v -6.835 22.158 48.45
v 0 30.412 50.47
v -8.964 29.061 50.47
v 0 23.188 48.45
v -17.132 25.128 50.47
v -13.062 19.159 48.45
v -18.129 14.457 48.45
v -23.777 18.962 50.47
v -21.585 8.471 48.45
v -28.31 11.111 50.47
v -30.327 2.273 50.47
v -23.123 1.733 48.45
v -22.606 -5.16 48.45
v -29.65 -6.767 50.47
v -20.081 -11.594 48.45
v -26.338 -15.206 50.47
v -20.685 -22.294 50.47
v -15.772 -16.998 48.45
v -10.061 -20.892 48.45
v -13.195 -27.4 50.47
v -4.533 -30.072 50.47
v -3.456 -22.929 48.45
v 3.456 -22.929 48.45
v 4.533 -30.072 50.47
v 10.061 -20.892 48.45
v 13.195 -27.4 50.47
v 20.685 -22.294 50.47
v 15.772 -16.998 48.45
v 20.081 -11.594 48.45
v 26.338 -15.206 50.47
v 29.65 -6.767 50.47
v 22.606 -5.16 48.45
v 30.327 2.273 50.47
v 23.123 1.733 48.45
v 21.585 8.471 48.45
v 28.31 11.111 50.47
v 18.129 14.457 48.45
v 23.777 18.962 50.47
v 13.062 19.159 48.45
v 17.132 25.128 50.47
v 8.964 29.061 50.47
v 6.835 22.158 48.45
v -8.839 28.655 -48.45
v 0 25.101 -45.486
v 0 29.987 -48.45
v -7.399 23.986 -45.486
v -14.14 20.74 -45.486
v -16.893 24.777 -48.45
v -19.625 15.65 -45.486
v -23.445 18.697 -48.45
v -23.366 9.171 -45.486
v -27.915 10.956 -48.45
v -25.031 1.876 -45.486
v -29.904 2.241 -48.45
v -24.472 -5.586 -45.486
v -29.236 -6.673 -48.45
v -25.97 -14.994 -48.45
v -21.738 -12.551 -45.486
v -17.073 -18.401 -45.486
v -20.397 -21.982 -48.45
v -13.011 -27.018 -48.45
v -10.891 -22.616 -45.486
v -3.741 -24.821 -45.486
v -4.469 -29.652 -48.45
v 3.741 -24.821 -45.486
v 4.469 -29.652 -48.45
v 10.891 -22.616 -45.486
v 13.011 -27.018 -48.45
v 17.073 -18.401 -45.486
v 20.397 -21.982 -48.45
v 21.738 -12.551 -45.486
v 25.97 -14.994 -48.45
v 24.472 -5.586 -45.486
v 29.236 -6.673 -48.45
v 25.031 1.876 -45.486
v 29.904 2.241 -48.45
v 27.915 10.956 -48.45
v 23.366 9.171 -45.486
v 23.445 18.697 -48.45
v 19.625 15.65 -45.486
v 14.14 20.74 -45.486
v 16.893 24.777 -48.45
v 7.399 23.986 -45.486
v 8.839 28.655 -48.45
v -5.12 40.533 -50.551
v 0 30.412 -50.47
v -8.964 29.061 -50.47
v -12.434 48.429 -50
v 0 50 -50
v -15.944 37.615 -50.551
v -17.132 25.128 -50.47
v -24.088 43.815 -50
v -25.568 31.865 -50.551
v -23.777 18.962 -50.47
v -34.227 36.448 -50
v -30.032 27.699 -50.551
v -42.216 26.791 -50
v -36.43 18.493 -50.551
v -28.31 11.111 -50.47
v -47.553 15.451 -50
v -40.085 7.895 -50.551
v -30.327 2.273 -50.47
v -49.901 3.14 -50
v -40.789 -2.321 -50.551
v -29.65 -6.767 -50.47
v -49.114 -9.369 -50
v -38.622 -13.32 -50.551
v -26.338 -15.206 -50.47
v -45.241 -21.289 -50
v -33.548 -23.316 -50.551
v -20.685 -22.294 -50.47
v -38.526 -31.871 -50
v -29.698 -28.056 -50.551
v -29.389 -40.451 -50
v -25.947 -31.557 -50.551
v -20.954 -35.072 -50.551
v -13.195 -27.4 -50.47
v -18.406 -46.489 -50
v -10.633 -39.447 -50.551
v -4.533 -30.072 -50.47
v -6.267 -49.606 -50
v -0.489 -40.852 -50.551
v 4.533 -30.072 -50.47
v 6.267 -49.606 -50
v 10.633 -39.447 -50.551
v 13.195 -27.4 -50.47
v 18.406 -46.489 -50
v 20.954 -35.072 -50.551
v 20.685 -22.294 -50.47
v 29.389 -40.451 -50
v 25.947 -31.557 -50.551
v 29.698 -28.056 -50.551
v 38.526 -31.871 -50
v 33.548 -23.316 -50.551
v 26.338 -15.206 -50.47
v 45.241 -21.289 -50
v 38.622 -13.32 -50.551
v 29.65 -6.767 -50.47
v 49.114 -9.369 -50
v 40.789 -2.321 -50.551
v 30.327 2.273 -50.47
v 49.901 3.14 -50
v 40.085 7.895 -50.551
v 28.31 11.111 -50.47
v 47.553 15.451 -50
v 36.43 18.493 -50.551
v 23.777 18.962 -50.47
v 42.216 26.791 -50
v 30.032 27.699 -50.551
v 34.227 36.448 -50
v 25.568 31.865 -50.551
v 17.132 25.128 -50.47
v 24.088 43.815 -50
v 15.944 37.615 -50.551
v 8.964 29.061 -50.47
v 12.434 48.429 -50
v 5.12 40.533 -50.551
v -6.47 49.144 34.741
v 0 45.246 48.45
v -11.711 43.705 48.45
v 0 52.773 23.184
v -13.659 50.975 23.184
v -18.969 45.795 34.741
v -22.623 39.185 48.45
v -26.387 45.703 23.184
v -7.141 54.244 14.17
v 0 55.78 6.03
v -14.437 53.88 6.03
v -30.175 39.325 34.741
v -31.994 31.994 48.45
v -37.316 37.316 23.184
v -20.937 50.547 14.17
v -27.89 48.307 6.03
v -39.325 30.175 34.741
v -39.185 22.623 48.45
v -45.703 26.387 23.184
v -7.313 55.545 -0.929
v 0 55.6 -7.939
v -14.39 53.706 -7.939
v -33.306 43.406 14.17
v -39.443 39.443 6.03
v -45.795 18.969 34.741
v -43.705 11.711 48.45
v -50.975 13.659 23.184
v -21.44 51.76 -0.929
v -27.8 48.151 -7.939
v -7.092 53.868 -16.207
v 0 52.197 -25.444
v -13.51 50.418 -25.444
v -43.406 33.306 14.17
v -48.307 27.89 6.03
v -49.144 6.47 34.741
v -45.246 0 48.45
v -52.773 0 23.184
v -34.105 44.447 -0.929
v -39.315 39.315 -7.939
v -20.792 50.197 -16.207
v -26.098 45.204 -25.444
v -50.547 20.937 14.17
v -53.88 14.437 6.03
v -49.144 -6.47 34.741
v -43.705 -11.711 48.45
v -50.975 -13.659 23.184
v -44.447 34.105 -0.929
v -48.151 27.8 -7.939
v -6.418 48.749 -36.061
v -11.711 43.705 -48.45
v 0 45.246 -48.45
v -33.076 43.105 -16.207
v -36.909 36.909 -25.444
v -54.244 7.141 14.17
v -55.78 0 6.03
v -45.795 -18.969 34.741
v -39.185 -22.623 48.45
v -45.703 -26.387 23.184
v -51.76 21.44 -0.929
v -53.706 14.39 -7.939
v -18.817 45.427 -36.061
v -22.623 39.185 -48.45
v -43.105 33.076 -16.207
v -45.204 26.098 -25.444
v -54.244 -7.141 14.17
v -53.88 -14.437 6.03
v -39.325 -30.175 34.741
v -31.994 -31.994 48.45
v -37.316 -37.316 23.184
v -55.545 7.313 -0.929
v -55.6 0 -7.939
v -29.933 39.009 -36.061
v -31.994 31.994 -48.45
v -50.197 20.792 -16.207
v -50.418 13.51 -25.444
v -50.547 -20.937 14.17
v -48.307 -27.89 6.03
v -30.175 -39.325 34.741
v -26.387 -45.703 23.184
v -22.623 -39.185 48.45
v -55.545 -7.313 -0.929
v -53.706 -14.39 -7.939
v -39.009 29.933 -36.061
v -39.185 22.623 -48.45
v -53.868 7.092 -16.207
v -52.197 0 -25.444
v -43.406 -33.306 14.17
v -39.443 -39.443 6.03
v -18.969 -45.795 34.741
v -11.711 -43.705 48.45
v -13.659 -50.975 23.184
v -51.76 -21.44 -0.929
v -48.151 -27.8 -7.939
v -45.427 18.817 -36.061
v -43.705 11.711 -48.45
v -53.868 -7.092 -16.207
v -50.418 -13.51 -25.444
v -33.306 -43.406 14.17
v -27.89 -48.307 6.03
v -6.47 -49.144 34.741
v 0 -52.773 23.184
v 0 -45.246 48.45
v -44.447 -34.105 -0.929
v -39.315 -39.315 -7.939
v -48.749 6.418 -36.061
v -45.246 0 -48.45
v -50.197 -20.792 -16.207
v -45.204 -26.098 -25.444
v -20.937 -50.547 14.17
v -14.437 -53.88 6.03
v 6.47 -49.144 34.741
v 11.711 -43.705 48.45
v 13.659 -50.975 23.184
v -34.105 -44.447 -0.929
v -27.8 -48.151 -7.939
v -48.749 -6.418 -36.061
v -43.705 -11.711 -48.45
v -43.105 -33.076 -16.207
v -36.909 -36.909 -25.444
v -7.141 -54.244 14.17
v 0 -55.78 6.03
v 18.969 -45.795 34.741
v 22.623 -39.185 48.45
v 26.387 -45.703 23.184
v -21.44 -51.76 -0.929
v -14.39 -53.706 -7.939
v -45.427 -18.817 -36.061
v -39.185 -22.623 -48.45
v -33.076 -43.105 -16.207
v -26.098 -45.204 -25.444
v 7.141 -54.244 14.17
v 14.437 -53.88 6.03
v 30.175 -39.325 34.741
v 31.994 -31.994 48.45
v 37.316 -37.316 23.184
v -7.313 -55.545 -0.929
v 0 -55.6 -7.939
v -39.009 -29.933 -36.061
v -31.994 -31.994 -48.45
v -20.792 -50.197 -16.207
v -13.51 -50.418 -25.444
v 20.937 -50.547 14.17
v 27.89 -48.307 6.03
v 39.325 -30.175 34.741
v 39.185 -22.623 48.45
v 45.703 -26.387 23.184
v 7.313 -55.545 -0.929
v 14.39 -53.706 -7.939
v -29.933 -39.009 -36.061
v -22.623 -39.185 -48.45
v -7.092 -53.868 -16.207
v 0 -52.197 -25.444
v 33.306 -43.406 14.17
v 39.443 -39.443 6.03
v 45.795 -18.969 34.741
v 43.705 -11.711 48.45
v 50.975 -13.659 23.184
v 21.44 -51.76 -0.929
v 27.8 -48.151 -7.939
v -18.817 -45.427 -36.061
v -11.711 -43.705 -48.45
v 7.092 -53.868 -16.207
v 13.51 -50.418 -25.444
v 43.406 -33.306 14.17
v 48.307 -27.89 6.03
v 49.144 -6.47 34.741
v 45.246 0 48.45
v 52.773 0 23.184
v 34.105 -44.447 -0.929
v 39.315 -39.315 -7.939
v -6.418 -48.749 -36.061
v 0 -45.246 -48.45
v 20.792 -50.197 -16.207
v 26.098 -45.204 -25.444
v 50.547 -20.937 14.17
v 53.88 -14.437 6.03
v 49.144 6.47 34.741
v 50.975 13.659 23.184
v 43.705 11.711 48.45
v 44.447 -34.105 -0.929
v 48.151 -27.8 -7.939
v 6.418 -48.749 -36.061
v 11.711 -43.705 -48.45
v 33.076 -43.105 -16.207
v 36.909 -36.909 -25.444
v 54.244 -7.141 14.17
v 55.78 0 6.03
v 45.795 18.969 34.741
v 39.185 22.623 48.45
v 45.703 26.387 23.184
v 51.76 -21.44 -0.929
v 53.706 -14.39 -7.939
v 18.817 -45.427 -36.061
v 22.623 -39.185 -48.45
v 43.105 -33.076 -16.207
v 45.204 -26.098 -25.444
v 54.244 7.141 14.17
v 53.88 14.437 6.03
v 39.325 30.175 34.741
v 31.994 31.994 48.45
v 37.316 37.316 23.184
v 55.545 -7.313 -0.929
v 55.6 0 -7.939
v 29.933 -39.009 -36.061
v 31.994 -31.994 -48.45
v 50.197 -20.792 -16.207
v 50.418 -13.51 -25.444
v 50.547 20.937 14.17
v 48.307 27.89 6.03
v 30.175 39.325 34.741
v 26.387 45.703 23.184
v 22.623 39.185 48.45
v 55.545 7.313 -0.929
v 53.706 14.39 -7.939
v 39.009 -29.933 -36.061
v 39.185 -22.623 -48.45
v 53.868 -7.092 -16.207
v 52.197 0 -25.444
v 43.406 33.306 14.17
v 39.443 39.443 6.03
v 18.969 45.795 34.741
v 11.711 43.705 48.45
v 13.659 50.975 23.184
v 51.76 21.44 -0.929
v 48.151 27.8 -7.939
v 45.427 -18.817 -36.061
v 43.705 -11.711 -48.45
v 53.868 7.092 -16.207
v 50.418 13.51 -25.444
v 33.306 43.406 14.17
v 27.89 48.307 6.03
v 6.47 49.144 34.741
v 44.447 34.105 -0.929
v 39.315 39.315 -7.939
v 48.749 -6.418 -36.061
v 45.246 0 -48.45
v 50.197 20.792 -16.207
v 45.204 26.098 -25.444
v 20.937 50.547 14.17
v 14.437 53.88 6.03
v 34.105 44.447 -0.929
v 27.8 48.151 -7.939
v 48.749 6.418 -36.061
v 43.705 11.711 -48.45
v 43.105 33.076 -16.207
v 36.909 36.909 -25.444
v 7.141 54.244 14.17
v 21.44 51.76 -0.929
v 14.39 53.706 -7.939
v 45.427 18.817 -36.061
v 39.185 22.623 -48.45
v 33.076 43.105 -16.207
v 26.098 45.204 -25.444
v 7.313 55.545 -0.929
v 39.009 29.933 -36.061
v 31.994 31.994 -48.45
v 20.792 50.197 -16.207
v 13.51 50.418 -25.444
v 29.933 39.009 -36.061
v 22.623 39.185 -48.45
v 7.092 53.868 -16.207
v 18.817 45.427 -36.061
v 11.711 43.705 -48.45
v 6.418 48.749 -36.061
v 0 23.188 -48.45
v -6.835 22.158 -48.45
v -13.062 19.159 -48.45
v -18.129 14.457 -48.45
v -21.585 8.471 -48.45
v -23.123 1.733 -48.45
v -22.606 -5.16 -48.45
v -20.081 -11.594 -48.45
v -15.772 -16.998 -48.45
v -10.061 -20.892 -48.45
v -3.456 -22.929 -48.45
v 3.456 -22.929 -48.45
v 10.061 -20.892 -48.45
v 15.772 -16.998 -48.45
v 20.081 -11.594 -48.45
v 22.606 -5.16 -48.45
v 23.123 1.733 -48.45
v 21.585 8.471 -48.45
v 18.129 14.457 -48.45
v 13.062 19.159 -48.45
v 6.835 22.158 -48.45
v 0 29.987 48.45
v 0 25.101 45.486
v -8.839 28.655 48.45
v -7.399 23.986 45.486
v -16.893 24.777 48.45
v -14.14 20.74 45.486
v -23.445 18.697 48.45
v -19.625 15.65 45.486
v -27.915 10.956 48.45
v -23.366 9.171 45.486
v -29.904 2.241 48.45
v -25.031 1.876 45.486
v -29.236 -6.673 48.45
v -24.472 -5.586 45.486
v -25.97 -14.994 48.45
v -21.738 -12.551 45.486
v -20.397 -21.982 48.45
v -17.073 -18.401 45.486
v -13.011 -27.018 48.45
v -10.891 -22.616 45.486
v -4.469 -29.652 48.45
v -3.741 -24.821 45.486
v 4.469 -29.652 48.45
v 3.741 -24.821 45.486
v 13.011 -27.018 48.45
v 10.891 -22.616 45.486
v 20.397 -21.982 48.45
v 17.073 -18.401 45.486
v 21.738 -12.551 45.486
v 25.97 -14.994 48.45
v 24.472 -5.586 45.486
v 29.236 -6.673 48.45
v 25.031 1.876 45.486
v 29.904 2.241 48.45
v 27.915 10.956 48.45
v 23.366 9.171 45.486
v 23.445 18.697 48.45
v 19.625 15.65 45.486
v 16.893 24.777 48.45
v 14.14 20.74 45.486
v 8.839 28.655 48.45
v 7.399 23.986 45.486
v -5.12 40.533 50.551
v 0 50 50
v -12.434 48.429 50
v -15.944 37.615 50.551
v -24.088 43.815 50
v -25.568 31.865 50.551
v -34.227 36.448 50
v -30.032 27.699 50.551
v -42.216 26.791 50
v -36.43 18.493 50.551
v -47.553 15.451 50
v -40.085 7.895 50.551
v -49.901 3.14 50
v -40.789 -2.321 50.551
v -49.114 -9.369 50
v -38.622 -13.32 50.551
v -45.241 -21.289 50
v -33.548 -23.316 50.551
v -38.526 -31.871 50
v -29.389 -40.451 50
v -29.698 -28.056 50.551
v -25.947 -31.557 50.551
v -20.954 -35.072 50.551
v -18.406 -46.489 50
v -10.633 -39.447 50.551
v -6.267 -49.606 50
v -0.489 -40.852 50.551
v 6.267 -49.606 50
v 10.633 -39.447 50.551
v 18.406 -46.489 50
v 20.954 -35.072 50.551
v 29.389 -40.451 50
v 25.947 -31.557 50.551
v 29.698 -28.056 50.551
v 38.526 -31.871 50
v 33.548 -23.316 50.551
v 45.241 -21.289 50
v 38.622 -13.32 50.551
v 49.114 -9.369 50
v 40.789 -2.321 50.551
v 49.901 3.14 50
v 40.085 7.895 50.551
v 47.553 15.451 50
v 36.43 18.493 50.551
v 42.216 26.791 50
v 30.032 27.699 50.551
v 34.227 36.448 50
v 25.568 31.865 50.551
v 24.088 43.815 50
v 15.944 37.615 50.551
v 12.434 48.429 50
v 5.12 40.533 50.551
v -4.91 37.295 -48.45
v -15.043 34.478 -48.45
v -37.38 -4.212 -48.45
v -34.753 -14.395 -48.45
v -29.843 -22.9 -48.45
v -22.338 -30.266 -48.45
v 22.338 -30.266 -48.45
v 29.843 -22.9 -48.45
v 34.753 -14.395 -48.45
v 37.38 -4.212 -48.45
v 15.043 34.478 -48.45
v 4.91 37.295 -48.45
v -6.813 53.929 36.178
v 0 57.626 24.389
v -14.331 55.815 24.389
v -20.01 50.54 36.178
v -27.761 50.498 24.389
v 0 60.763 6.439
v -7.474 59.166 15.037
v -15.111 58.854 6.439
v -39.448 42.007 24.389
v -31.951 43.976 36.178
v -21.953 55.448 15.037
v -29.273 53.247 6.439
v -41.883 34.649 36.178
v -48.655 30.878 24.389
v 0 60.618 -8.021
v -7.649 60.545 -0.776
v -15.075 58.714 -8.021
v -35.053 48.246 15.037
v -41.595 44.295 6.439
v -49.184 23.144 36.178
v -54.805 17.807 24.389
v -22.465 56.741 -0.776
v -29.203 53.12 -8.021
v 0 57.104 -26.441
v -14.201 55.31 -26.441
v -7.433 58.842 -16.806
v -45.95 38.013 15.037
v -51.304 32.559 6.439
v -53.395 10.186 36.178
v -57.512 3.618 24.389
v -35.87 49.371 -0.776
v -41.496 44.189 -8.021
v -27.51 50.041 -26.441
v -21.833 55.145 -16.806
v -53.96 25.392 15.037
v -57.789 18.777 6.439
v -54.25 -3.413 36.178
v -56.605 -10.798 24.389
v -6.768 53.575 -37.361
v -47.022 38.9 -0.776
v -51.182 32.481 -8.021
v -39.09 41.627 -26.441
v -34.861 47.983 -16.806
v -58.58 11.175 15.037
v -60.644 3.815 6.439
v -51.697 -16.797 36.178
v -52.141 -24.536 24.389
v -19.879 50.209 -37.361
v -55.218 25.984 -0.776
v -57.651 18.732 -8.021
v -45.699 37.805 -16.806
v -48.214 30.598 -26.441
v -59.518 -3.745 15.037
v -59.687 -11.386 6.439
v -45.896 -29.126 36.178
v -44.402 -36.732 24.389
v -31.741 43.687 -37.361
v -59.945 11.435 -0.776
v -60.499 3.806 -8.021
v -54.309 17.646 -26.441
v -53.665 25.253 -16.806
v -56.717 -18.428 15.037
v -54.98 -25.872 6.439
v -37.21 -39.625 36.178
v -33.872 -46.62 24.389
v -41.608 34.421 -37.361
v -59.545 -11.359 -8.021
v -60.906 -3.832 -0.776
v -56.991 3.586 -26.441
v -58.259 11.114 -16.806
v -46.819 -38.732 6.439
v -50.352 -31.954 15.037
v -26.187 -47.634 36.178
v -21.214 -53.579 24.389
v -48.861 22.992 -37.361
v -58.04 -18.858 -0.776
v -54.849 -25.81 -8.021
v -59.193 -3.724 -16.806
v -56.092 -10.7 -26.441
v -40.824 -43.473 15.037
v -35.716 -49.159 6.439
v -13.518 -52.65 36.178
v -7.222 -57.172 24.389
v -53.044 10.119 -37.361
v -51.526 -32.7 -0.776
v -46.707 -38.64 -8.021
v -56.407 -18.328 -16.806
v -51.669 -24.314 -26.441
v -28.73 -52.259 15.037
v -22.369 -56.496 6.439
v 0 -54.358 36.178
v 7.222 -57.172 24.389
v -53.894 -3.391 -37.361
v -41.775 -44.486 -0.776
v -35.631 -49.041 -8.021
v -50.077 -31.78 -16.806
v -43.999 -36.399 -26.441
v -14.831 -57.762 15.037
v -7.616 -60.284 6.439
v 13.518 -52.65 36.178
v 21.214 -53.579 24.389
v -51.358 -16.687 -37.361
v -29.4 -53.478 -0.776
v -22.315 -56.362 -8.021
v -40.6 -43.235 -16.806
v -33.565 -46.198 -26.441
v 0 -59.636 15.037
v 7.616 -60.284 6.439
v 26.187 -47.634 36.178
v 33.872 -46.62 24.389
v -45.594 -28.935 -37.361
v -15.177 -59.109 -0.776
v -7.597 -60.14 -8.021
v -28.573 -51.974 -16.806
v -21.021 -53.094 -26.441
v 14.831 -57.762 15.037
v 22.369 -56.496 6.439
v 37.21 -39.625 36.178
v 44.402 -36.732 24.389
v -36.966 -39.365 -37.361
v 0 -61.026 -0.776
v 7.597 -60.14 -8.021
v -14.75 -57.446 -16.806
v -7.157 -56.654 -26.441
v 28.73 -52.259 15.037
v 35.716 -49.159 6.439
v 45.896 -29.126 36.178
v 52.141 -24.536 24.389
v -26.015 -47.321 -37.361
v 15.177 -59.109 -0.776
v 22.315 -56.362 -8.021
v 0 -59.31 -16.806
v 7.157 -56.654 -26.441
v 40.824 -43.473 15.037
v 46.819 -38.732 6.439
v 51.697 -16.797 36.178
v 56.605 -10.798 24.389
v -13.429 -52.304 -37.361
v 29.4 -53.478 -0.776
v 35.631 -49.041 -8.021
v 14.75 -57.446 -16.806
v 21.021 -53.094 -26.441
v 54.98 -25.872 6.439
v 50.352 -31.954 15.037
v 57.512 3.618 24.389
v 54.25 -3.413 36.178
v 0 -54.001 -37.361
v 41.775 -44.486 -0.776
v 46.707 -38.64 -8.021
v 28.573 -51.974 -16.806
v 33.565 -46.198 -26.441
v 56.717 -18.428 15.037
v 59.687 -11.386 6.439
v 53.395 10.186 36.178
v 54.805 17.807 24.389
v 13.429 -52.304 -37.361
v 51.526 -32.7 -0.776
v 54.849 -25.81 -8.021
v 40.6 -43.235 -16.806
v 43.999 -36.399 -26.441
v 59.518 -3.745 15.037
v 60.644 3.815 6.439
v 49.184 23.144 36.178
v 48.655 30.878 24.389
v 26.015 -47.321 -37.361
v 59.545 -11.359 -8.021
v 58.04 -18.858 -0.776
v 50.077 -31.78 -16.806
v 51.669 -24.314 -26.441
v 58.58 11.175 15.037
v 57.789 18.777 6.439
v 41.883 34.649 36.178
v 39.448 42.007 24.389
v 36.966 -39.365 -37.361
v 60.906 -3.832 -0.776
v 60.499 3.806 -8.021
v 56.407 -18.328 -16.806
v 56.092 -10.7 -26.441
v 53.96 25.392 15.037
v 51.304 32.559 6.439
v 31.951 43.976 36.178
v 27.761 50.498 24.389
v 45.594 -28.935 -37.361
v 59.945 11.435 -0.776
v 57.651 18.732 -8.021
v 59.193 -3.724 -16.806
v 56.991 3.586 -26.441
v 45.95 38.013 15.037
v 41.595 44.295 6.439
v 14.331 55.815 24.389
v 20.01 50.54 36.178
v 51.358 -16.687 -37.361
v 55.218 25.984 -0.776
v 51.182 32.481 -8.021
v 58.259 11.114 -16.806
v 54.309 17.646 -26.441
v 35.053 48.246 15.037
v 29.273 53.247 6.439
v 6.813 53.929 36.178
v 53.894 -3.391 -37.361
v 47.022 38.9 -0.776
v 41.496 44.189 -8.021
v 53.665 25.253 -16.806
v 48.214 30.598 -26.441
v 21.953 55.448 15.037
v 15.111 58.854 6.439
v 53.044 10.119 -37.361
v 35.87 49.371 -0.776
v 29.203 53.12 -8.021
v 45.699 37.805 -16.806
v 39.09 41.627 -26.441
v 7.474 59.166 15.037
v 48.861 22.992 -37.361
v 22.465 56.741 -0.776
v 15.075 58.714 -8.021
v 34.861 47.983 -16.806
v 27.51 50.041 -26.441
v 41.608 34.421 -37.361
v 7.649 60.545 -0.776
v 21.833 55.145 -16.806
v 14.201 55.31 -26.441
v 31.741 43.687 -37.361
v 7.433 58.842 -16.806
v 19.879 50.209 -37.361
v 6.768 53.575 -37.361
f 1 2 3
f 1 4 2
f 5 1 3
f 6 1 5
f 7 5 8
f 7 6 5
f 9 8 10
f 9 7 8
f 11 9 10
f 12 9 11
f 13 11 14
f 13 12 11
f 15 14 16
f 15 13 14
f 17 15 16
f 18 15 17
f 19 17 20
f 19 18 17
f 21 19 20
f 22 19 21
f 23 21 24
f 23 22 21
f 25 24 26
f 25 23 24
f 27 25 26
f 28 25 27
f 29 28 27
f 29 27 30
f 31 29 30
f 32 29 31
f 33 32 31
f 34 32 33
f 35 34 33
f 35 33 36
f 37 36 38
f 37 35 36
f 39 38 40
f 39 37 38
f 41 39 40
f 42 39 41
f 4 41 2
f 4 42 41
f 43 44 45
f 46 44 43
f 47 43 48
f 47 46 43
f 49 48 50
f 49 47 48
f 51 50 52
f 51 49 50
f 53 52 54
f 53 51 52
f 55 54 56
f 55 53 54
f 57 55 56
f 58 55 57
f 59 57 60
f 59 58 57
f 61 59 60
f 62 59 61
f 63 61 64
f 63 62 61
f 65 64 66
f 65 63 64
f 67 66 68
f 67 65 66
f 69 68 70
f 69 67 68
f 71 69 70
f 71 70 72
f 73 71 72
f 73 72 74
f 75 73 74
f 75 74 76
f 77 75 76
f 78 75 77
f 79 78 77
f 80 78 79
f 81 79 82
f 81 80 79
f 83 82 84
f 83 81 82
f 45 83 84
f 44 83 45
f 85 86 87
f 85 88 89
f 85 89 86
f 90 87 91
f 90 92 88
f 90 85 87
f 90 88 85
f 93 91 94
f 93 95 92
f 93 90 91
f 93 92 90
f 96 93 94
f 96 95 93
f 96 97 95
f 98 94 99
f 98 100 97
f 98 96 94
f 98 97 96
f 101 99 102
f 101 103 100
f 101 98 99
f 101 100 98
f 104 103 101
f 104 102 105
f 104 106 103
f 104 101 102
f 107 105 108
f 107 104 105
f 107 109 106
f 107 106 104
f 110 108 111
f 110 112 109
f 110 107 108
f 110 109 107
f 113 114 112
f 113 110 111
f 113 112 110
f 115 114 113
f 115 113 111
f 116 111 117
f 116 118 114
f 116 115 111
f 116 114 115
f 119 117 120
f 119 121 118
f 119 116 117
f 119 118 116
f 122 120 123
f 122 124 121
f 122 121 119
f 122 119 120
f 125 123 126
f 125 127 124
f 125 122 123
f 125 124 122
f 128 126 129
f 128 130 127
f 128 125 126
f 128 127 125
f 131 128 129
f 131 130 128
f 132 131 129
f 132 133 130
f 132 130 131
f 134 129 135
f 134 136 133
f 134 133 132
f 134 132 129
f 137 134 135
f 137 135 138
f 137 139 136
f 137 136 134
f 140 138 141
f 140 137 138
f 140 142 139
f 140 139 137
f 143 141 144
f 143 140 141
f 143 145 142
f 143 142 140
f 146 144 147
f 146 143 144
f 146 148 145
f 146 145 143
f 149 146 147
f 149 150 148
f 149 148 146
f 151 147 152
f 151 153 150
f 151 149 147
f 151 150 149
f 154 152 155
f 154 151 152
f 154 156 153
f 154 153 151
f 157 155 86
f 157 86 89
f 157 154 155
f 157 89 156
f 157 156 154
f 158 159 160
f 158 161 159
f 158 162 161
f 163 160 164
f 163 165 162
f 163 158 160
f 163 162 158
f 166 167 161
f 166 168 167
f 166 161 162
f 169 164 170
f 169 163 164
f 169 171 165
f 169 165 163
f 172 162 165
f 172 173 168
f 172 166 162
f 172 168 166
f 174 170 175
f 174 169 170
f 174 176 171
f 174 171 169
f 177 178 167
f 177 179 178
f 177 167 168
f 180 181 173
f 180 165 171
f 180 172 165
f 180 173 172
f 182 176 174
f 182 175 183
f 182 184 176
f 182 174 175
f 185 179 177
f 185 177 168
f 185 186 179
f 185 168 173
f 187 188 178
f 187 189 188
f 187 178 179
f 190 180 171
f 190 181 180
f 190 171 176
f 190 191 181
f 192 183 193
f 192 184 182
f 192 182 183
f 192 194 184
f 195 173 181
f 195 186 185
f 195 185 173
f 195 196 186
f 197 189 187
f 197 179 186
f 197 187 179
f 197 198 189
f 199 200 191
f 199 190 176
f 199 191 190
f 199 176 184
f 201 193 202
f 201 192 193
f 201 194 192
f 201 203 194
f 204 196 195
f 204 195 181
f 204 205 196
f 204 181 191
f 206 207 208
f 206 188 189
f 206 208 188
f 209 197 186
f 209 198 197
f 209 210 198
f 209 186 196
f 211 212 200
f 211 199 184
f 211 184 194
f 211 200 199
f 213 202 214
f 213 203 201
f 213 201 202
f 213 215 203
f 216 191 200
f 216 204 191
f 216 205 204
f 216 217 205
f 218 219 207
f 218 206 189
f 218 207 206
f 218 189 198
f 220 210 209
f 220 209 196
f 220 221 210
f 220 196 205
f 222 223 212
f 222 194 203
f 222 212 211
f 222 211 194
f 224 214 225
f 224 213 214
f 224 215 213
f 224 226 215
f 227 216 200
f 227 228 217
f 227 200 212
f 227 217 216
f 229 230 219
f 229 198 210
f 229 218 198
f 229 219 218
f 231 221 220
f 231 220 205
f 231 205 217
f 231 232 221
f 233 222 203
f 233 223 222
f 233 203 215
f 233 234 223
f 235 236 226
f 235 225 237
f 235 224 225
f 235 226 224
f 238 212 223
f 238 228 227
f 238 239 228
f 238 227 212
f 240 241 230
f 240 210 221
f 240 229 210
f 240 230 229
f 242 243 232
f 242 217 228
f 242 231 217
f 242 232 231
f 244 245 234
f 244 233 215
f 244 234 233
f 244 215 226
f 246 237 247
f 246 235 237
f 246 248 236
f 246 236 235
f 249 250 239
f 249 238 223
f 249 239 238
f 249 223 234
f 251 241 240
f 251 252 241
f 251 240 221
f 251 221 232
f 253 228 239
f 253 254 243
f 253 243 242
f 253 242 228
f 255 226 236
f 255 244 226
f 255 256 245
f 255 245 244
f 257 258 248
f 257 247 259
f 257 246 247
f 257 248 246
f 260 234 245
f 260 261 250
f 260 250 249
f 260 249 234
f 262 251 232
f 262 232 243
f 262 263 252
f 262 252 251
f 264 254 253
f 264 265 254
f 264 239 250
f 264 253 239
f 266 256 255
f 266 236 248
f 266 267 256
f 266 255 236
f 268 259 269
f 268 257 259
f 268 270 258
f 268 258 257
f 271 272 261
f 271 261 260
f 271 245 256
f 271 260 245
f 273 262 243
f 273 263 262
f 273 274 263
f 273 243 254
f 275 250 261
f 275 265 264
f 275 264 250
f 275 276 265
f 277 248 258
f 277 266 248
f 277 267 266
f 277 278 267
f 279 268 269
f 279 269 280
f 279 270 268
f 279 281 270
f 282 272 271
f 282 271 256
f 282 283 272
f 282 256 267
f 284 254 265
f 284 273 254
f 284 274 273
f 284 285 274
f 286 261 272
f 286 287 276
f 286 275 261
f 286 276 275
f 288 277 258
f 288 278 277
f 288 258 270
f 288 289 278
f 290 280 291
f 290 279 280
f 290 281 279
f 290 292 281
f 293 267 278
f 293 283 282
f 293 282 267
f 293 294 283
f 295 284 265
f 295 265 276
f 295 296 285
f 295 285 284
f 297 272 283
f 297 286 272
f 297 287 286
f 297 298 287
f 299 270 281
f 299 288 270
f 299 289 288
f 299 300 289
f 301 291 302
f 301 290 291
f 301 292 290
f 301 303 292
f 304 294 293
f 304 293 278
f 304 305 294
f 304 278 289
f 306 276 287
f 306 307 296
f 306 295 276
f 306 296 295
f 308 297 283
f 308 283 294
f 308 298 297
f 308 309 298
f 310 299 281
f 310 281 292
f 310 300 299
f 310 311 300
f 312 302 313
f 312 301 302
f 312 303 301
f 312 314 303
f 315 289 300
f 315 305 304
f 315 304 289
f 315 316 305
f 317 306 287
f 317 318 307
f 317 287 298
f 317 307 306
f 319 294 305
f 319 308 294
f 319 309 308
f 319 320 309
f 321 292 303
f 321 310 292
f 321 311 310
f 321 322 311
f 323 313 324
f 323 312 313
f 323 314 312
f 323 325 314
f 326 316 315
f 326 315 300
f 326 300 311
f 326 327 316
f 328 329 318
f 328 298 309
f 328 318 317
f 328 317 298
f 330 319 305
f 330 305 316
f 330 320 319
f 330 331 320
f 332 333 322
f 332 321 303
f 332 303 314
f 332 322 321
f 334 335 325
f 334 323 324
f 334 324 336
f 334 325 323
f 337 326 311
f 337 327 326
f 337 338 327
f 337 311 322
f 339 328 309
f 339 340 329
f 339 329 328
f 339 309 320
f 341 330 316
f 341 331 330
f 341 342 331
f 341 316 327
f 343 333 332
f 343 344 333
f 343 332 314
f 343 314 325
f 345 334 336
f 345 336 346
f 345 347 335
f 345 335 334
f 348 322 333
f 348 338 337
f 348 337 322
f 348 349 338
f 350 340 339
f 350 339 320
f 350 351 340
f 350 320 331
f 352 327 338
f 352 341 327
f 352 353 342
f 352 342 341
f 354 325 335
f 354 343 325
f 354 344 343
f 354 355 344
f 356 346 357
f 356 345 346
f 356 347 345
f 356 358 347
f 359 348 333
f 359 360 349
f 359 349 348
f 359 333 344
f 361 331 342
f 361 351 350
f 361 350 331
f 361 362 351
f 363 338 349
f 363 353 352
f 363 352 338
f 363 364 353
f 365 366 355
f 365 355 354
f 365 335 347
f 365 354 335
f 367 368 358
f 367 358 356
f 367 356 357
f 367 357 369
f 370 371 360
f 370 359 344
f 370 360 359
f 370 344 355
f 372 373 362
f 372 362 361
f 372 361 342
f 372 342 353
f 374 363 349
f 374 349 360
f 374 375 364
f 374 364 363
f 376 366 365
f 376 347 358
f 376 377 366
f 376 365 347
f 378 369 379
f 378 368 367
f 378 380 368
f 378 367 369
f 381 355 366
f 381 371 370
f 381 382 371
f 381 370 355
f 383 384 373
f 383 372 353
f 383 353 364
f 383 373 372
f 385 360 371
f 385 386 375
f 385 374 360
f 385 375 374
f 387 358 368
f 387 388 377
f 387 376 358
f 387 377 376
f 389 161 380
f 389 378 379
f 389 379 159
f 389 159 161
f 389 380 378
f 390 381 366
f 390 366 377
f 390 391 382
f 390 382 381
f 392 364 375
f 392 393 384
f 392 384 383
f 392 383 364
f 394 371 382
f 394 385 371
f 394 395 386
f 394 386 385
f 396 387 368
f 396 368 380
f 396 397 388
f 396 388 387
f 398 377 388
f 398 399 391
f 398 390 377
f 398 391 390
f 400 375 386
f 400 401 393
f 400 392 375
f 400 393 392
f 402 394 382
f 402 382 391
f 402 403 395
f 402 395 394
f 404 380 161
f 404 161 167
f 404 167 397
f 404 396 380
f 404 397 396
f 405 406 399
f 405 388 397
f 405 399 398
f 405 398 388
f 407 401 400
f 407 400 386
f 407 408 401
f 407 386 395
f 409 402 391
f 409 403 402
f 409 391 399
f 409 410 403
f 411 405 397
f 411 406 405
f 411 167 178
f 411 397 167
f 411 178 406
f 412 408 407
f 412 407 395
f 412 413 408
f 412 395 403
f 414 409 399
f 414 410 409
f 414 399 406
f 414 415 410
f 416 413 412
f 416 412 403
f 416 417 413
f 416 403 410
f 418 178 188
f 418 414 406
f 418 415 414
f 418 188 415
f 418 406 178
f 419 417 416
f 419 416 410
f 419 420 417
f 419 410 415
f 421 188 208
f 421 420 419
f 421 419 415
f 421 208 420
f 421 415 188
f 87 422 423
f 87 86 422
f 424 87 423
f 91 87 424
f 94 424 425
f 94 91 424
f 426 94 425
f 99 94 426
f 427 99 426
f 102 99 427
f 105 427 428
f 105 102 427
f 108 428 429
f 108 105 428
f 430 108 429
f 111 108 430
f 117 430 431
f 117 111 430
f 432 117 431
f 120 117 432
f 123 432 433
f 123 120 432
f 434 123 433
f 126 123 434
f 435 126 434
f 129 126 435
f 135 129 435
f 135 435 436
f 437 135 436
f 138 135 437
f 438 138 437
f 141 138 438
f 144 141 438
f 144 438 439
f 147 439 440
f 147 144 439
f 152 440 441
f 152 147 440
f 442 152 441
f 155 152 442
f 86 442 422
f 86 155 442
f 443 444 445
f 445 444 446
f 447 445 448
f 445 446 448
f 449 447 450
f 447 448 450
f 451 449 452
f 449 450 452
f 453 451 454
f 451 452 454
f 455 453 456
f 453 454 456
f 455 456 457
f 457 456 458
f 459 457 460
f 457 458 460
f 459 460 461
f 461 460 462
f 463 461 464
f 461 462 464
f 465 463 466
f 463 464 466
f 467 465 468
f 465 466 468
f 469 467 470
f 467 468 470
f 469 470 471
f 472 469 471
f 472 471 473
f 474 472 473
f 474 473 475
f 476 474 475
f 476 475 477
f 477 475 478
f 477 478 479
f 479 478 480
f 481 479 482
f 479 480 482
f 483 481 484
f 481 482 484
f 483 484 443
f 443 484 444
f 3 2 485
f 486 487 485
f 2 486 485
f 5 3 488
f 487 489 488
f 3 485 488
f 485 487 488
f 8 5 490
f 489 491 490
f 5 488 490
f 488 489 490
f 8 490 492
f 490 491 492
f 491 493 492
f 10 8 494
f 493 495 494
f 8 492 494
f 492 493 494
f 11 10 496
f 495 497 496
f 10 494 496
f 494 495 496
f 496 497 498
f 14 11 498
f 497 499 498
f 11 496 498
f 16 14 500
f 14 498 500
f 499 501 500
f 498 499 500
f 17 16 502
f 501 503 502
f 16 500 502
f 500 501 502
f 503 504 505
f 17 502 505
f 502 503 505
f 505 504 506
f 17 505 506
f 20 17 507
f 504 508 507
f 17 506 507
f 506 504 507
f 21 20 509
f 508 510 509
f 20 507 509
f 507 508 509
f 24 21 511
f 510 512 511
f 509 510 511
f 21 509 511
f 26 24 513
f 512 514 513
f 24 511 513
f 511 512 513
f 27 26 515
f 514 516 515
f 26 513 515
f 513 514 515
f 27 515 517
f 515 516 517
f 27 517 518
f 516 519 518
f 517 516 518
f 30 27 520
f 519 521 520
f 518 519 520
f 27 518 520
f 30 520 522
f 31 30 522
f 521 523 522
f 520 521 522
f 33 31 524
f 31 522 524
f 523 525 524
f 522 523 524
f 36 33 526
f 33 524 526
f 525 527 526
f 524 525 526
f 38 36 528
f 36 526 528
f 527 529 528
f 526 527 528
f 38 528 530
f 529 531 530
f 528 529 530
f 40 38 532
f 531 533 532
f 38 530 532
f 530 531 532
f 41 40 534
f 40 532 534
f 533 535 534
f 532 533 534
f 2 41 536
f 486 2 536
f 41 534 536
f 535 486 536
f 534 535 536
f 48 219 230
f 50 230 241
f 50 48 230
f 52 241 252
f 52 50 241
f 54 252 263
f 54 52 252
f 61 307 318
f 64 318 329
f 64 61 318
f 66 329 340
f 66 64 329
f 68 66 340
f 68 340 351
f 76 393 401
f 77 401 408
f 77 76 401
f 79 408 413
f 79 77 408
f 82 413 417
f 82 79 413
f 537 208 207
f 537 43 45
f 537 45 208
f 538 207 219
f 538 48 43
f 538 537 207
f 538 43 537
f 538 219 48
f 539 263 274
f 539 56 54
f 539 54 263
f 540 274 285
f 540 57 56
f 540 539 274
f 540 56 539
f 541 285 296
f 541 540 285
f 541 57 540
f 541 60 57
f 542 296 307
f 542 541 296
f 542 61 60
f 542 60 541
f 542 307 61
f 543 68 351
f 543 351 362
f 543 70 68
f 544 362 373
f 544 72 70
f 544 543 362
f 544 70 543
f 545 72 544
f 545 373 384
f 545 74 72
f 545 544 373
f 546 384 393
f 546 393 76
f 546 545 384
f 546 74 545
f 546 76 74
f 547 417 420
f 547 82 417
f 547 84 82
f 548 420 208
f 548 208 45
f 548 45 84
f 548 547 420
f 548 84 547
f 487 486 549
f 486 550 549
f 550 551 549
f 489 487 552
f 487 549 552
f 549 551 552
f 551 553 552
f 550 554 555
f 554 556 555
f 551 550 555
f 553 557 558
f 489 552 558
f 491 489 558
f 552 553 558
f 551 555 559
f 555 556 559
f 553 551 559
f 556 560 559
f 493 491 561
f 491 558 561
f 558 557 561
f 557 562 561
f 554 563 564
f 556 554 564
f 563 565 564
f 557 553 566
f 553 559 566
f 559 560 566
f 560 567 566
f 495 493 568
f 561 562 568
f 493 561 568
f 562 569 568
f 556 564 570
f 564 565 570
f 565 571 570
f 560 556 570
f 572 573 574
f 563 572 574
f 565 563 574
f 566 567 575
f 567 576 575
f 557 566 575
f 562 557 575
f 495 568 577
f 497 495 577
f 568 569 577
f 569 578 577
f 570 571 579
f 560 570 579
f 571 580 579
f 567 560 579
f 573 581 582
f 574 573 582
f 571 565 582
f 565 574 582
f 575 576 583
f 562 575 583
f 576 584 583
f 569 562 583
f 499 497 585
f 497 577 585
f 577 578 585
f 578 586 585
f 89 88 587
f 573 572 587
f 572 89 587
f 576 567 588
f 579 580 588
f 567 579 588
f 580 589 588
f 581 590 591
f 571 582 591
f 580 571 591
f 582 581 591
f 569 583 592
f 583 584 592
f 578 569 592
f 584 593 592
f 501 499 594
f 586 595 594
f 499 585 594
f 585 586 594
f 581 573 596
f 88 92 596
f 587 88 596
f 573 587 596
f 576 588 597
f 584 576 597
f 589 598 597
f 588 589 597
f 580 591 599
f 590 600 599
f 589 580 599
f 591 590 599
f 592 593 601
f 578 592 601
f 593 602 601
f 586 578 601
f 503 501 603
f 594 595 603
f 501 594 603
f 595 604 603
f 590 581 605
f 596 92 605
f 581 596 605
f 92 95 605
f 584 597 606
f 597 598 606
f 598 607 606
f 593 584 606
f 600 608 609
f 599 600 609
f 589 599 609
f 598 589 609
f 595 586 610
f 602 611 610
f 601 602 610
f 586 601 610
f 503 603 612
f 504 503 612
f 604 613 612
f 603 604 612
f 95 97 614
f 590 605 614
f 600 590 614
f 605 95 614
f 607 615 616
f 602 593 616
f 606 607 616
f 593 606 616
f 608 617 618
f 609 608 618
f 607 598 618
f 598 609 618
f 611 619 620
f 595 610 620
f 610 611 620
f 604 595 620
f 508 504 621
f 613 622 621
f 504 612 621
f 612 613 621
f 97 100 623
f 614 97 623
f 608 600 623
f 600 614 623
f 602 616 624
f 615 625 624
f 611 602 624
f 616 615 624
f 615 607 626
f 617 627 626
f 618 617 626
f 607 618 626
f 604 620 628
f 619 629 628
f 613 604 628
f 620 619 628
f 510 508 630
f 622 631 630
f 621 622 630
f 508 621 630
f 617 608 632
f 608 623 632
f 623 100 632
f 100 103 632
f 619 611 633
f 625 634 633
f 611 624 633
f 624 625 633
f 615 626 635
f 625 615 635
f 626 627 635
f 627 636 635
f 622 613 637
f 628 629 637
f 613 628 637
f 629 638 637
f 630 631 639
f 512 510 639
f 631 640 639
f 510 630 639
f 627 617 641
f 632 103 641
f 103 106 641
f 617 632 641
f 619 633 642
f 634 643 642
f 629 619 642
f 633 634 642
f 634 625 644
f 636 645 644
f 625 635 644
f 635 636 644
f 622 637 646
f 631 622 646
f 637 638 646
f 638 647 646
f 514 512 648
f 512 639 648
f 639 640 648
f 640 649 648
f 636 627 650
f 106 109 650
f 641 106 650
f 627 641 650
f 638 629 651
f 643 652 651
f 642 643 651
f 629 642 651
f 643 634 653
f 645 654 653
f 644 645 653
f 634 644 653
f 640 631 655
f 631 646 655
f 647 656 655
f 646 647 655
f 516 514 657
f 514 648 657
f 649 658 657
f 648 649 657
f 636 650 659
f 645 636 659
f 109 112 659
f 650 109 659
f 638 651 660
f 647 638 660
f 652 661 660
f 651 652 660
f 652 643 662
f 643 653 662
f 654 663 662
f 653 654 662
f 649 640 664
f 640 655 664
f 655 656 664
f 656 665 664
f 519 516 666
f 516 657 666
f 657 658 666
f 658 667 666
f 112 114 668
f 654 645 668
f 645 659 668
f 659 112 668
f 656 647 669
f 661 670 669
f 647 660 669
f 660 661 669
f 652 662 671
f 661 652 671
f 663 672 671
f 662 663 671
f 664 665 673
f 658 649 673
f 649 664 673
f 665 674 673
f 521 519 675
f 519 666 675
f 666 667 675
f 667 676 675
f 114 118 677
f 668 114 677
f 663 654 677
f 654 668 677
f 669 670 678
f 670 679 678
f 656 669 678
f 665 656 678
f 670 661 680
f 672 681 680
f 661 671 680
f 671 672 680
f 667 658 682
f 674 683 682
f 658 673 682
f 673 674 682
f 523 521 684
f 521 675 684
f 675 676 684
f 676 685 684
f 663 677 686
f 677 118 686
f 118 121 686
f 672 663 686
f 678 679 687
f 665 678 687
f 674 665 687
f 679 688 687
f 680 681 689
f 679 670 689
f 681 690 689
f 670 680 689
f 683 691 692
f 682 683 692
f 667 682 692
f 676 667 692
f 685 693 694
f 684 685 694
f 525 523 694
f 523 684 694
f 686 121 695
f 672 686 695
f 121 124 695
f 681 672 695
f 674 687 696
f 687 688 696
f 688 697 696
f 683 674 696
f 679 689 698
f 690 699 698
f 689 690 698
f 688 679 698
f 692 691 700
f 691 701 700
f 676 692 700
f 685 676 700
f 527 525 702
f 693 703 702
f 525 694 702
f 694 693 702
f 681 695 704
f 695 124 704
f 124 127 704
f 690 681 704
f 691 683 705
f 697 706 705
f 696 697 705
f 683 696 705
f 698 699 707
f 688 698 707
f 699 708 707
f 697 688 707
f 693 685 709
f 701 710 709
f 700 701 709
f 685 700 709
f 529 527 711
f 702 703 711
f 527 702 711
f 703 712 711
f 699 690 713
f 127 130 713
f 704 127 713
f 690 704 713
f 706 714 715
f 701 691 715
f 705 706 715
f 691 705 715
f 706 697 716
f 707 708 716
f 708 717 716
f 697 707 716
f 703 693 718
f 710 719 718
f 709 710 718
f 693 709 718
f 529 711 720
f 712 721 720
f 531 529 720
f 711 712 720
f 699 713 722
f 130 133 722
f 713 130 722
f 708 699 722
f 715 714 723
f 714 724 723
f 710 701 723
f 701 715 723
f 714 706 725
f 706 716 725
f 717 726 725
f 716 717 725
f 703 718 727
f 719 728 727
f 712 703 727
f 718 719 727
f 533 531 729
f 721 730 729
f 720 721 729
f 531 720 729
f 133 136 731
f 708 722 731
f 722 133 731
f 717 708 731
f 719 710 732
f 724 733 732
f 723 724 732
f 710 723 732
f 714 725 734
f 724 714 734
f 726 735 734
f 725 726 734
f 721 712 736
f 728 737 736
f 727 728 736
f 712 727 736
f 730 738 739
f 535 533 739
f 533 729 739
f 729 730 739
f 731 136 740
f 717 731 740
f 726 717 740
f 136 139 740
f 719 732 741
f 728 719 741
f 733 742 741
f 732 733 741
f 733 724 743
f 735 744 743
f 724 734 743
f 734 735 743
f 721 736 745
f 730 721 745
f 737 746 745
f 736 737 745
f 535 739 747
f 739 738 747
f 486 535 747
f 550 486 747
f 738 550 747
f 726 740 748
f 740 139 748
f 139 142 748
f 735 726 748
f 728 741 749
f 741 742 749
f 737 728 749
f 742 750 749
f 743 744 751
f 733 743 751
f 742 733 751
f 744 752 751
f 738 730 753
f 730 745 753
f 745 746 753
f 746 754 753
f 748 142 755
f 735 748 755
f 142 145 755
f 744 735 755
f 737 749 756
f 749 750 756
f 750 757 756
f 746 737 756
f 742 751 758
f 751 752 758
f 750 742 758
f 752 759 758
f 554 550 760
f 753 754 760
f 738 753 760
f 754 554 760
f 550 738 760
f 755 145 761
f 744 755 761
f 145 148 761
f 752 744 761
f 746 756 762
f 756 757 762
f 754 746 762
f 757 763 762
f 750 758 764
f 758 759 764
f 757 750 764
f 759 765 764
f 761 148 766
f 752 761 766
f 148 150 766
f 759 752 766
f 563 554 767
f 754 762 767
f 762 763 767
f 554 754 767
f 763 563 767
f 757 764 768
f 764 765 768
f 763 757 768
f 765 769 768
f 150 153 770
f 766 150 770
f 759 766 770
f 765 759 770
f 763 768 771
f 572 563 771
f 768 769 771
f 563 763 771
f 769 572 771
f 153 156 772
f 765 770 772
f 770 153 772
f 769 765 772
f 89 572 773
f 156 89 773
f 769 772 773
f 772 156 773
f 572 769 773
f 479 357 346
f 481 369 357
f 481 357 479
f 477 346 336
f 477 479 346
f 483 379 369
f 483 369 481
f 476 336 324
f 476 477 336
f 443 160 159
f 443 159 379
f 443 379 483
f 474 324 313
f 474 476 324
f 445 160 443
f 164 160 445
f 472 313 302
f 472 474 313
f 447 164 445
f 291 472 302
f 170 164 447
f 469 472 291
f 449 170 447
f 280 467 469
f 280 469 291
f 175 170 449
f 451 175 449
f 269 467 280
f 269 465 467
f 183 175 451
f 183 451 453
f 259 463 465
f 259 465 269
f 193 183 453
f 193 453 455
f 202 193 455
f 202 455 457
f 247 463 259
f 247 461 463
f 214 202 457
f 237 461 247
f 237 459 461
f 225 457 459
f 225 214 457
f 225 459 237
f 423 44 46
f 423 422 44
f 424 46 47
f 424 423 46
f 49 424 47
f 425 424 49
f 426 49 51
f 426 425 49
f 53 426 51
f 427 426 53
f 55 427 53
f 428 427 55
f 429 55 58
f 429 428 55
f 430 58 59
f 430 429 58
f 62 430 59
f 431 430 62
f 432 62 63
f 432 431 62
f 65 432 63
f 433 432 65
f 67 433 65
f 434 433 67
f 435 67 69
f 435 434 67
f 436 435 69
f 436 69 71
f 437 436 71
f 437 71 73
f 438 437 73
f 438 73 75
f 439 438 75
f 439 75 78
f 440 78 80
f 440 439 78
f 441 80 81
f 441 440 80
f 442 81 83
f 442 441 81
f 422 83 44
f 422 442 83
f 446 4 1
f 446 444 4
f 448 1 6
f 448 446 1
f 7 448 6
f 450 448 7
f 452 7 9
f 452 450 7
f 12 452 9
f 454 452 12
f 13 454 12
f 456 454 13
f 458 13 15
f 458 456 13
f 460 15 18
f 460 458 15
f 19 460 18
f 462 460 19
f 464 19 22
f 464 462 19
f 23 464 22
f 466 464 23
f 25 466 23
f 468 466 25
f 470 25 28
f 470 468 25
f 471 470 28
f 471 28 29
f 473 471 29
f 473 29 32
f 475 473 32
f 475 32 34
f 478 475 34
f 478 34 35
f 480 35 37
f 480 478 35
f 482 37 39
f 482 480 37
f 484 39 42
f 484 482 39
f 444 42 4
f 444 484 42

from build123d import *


with BuildPart() as part:
    # Sketch1 → Revolve1 (revolve)
    with BuildSketch(Plane(origin=(0, 0, 0), x_dir=(0, 0, -1), z_dir=(1, 0, 0))):
        with BuildLine():
            Line((-50.470077562, 30.411993884), (-48.449762995, 23.187851833))
            Line((-48.449762995, 23.187851833), (-45.48586414, 25.101449815))
            add(Edge.make_bspline(
                [(-48.449762995, 29.987422205), (-45.48586414, 25.101449815)],
                knots=[0, 0, 1, 1], degree=1))
            Line((-48.449762995, 29.987422205), (-48.449762995, 45.246394502))
            add(Edge.make_bspline(
                [(-48.449762995, 45.246394502), (-47.757317605, 45.472213508), (-46.35900942, 45.926672767), (-43.664040744, 46.795537761), (-40.409694064, 47.830094642), (-36.698146611, 48.98157899), (-31.983562013, 50.399456097), (-26.503127038, 51.950356049), (-20.489517686, 53.458887096), (-14.940594209, 54.61890372), (-8.022237241, 55.709950303), (-1.75e-07, 56.243893826), (8.022236964, 55.709949788), (14.940594045, 54.618902886), (20.489517621, 53.458886102), (26.503127078, 51.950355008), (31.983562139, 50.399455141), (36.698146804, 48.981578194), (40.409694306, 47.830094016), (43.664041026, 46.795537322), (46.359009733, 45.926672506), (47.757317932, 45.472213347), (48.449763331, 45.246394393)],
                knots=[0, 0, 0, 0, 0.015625, 0.03125, 0.0625, 0.09375, 0.125, 0.1875, 0.25, 0.3125, 0.375, 0.5, 0.625, 0.6875, 0.75, 0.8125, 0.875, 0.90625, 0.9375, 0.96875, 0.984375, 1, 1, 1, 1], degree=3))
            Line((48.449763331, 45.246394393), (48.449762995, 29.987422205))
            add(Edge.make_bspline(
                [(48.449762995, 29.987422205), (45.48586414, 25.101449815)],
                knots=[0, 0, 1, 1], degree=1))
            Line((45.48586414, 25.101449815), (48.449762995, 23.187851833))
            Line((48.449762995, 23.187851833), (50.470077562, 30.411993884))
            add(Edge.make_bspline(
                [(50.470077562, 30.411993884), (50.866201642, 41.503468145), (50, 50)],
                knots=[0, 0, 0, 1, 1, 1], degree=2))
            add(Edge.make_bspline(
                [(-50, 50), (-4.902570045, 64.707090179), (4.902570045, 64.707086659), (50, 50)],
                knots=[0, 0, 0, 0, 1, 1, 1, 1], degree=3))
            add(Edge.make_bspline(
                [(-50.470077562, 30.411993884), (-50.866201642, 41.503468145), (-50, 50)],
                knots=[0, 0, 0, 1, 1, 1], degree=2))
        make_face()
    revolve(axis=Axis((0, 0, -45.444553904), (0, 0, 1)))


solid = part.part
